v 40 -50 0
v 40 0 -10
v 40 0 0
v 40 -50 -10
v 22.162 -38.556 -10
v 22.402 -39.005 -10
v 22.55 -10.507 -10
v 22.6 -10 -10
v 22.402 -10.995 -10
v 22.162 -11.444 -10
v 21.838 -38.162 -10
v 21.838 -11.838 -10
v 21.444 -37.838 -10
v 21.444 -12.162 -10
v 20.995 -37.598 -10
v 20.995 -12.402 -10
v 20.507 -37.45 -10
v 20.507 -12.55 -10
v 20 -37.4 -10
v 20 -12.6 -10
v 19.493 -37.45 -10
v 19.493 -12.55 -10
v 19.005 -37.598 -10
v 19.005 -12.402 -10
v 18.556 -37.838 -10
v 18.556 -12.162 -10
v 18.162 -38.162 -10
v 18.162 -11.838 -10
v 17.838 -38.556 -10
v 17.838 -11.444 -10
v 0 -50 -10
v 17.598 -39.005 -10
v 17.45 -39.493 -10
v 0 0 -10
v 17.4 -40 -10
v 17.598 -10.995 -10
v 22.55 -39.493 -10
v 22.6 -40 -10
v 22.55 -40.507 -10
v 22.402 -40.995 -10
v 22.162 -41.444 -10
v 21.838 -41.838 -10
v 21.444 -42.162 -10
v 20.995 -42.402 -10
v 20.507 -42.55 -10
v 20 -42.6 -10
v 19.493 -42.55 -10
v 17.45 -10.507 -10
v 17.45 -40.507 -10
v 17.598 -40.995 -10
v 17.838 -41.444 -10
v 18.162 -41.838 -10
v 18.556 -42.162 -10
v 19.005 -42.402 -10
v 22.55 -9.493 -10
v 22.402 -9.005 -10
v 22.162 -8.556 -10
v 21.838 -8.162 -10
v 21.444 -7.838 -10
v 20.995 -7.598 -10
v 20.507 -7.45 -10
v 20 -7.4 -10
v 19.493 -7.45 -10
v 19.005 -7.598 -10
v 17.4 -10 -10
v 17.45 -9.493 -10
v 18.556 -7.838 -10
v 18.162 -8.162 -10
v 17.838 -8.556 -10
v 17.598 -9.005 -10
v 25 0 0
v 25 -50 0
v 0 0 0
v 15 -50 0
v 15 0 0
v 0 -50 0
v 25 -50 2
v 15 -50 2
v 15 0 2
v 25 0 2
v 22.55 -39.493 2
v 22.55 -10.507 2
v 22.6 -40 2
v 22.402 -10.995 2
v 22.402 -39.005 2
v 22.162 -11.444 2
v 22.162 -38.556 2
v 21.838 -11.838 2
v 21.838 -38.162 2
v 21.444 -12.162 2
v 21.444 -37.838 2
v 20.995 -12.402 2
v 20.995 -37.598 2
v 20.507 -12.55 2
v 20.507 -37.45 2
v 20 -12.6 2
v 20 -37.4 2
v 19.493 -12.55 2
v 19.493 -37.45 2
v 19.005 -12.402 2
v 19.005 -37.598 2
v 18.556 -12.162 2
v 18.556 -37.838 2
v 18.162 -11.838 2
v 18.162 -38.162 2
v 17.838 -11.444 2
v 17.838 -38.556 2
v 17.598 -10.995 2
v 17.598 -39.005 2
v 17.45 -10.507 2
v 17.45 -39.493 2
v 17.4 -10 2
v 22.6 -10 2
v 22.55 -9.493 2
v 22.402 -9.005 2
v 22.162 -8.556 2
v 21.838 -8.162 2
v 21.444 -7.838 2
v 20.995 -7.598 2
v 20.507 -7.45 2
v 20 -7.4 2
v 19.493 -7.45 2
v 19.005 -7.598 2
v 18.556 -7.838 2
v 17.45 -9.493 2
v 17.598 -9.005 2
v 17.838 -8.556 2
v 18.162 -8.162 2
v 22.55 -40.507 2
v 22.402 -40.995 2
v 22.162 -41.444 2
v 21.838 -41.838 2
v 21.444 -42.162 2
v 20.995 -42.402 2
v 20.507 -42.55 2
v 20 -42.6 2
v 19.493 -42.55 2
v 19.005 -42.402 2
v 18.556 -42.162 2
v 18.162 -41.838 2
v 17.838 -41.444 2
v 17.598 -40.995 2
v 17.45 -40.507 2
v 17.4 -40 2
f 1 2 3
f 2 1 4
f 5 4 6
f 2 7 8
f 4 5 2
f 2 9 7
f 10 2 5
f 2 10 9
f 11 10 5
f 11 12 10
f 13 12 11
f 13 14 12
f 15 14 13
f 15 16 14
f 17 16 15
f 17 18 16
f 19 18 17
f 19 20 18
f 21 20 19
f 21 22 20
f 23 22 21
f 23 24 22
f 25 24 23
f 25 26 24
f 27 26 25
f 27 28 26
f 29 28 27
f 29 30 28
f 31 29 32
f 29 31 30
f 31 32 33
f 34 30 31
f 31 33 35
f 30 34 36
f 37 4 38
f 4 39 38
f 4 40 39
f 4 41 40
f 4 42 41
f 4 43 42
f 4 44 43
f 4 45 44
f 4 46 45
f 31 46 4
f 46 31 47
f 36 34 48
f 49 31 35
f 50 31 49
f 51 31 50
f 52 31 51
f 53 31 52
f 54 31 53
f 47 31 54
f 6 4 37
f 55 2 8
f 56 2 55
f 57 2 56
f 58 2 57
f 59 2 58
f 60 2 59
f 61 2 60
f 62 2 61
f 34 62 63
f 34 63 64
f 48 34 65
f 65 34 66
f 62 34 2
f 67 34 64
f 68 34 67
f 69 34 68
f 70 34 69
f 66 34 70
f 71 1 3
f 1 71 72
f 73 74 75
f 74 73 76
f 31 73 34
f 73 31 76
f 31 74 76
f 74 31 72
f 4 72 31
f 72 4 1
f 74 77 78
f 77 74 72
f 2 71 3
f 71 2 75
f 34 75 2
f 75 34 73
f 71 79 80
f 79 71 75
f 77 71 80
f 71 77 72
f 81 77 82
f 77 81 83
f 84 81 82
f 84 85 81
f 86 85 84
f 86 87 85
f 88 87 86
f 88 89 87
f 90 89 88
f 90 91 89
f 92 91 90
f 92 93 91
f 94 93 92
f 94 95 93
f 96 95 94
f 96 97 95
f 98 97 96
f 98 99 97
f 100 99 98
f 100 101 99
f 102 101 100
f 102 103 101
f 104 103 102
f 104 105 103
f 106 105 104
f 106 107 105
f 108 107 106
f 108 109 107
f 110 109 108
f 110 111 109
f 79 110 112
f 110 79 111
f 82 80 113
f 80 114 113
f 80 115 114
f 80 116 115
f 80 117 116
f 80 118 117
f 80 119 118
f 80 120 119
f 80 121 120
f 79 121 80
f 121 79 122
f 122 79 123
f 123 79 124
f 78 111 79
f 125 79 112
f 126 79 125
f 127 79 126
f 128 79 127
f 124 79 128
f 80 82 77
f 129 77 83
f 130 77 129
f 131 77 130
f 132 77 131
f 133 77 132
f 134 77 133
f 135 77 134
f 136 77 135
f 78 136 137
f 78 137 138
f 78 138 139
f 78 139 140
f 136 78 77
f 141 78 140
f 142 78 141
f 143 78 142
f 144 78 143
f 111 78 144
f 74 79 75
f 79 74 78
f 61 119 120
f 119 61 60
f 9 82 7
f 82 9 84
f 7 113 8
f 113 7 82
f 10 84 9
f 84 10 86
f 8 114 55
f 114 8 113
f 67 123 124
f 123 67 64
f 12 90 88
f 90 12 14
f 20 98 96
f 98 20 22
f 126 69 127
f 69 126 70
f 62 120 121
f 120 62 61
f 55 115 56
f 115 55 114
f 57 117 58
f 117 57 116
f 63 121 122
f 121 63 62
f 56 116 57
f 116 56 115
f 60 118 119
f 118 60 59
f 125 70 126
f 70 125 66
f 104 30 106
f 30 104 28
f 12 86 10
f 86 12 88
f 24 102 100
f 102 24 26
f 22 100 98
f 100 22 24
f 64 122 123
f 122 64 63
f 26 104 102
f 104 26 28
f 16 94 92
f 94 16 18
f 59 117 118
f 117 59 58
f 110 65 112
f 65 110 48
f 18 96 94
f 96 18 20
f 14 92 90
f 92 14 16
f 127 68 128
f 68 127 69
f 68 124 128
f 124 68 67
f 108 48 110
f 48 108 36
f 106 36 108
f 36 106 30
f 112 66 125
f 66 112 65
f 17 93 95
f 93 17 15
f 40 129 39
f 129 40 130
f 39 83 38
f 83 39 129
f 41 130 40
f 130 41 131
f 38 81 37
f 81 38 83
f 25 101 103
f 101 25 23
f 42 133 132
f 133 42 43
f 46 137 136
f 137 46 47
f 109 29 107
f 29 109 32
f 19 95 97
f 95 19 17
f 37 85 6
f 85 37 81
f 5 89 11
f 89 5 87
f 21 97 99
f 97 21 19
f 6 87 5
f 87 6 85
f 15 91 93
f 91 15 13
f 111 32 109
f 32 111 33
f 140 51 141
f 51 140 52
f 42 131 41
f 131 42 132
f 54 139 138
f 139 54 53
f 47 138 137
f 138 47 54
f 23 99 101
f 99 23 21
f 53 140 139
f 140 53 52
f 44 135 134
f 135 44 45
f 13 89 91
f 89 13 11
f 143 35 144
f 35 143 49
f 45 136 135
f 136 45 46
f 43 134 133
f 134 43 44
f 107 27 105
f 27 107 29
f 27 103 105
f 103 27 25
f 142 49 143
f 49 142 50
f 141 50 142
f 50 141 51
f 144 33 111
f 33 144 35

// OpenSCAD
rotate([180,0,0])
difference() {
  union() {
    cube([40, 50, 10]);
    translate([15, 0, -2]) {
      cube([10, 50, 2]);
    }
  }
  translate([20,10,-2.1]) {
    cylinder(h=14, d=5.2, $fn=32);
  }
  translate([20,40,-2.1]) {
    cylinder(h=14, d=5.2, $fn=32);
  }
}
